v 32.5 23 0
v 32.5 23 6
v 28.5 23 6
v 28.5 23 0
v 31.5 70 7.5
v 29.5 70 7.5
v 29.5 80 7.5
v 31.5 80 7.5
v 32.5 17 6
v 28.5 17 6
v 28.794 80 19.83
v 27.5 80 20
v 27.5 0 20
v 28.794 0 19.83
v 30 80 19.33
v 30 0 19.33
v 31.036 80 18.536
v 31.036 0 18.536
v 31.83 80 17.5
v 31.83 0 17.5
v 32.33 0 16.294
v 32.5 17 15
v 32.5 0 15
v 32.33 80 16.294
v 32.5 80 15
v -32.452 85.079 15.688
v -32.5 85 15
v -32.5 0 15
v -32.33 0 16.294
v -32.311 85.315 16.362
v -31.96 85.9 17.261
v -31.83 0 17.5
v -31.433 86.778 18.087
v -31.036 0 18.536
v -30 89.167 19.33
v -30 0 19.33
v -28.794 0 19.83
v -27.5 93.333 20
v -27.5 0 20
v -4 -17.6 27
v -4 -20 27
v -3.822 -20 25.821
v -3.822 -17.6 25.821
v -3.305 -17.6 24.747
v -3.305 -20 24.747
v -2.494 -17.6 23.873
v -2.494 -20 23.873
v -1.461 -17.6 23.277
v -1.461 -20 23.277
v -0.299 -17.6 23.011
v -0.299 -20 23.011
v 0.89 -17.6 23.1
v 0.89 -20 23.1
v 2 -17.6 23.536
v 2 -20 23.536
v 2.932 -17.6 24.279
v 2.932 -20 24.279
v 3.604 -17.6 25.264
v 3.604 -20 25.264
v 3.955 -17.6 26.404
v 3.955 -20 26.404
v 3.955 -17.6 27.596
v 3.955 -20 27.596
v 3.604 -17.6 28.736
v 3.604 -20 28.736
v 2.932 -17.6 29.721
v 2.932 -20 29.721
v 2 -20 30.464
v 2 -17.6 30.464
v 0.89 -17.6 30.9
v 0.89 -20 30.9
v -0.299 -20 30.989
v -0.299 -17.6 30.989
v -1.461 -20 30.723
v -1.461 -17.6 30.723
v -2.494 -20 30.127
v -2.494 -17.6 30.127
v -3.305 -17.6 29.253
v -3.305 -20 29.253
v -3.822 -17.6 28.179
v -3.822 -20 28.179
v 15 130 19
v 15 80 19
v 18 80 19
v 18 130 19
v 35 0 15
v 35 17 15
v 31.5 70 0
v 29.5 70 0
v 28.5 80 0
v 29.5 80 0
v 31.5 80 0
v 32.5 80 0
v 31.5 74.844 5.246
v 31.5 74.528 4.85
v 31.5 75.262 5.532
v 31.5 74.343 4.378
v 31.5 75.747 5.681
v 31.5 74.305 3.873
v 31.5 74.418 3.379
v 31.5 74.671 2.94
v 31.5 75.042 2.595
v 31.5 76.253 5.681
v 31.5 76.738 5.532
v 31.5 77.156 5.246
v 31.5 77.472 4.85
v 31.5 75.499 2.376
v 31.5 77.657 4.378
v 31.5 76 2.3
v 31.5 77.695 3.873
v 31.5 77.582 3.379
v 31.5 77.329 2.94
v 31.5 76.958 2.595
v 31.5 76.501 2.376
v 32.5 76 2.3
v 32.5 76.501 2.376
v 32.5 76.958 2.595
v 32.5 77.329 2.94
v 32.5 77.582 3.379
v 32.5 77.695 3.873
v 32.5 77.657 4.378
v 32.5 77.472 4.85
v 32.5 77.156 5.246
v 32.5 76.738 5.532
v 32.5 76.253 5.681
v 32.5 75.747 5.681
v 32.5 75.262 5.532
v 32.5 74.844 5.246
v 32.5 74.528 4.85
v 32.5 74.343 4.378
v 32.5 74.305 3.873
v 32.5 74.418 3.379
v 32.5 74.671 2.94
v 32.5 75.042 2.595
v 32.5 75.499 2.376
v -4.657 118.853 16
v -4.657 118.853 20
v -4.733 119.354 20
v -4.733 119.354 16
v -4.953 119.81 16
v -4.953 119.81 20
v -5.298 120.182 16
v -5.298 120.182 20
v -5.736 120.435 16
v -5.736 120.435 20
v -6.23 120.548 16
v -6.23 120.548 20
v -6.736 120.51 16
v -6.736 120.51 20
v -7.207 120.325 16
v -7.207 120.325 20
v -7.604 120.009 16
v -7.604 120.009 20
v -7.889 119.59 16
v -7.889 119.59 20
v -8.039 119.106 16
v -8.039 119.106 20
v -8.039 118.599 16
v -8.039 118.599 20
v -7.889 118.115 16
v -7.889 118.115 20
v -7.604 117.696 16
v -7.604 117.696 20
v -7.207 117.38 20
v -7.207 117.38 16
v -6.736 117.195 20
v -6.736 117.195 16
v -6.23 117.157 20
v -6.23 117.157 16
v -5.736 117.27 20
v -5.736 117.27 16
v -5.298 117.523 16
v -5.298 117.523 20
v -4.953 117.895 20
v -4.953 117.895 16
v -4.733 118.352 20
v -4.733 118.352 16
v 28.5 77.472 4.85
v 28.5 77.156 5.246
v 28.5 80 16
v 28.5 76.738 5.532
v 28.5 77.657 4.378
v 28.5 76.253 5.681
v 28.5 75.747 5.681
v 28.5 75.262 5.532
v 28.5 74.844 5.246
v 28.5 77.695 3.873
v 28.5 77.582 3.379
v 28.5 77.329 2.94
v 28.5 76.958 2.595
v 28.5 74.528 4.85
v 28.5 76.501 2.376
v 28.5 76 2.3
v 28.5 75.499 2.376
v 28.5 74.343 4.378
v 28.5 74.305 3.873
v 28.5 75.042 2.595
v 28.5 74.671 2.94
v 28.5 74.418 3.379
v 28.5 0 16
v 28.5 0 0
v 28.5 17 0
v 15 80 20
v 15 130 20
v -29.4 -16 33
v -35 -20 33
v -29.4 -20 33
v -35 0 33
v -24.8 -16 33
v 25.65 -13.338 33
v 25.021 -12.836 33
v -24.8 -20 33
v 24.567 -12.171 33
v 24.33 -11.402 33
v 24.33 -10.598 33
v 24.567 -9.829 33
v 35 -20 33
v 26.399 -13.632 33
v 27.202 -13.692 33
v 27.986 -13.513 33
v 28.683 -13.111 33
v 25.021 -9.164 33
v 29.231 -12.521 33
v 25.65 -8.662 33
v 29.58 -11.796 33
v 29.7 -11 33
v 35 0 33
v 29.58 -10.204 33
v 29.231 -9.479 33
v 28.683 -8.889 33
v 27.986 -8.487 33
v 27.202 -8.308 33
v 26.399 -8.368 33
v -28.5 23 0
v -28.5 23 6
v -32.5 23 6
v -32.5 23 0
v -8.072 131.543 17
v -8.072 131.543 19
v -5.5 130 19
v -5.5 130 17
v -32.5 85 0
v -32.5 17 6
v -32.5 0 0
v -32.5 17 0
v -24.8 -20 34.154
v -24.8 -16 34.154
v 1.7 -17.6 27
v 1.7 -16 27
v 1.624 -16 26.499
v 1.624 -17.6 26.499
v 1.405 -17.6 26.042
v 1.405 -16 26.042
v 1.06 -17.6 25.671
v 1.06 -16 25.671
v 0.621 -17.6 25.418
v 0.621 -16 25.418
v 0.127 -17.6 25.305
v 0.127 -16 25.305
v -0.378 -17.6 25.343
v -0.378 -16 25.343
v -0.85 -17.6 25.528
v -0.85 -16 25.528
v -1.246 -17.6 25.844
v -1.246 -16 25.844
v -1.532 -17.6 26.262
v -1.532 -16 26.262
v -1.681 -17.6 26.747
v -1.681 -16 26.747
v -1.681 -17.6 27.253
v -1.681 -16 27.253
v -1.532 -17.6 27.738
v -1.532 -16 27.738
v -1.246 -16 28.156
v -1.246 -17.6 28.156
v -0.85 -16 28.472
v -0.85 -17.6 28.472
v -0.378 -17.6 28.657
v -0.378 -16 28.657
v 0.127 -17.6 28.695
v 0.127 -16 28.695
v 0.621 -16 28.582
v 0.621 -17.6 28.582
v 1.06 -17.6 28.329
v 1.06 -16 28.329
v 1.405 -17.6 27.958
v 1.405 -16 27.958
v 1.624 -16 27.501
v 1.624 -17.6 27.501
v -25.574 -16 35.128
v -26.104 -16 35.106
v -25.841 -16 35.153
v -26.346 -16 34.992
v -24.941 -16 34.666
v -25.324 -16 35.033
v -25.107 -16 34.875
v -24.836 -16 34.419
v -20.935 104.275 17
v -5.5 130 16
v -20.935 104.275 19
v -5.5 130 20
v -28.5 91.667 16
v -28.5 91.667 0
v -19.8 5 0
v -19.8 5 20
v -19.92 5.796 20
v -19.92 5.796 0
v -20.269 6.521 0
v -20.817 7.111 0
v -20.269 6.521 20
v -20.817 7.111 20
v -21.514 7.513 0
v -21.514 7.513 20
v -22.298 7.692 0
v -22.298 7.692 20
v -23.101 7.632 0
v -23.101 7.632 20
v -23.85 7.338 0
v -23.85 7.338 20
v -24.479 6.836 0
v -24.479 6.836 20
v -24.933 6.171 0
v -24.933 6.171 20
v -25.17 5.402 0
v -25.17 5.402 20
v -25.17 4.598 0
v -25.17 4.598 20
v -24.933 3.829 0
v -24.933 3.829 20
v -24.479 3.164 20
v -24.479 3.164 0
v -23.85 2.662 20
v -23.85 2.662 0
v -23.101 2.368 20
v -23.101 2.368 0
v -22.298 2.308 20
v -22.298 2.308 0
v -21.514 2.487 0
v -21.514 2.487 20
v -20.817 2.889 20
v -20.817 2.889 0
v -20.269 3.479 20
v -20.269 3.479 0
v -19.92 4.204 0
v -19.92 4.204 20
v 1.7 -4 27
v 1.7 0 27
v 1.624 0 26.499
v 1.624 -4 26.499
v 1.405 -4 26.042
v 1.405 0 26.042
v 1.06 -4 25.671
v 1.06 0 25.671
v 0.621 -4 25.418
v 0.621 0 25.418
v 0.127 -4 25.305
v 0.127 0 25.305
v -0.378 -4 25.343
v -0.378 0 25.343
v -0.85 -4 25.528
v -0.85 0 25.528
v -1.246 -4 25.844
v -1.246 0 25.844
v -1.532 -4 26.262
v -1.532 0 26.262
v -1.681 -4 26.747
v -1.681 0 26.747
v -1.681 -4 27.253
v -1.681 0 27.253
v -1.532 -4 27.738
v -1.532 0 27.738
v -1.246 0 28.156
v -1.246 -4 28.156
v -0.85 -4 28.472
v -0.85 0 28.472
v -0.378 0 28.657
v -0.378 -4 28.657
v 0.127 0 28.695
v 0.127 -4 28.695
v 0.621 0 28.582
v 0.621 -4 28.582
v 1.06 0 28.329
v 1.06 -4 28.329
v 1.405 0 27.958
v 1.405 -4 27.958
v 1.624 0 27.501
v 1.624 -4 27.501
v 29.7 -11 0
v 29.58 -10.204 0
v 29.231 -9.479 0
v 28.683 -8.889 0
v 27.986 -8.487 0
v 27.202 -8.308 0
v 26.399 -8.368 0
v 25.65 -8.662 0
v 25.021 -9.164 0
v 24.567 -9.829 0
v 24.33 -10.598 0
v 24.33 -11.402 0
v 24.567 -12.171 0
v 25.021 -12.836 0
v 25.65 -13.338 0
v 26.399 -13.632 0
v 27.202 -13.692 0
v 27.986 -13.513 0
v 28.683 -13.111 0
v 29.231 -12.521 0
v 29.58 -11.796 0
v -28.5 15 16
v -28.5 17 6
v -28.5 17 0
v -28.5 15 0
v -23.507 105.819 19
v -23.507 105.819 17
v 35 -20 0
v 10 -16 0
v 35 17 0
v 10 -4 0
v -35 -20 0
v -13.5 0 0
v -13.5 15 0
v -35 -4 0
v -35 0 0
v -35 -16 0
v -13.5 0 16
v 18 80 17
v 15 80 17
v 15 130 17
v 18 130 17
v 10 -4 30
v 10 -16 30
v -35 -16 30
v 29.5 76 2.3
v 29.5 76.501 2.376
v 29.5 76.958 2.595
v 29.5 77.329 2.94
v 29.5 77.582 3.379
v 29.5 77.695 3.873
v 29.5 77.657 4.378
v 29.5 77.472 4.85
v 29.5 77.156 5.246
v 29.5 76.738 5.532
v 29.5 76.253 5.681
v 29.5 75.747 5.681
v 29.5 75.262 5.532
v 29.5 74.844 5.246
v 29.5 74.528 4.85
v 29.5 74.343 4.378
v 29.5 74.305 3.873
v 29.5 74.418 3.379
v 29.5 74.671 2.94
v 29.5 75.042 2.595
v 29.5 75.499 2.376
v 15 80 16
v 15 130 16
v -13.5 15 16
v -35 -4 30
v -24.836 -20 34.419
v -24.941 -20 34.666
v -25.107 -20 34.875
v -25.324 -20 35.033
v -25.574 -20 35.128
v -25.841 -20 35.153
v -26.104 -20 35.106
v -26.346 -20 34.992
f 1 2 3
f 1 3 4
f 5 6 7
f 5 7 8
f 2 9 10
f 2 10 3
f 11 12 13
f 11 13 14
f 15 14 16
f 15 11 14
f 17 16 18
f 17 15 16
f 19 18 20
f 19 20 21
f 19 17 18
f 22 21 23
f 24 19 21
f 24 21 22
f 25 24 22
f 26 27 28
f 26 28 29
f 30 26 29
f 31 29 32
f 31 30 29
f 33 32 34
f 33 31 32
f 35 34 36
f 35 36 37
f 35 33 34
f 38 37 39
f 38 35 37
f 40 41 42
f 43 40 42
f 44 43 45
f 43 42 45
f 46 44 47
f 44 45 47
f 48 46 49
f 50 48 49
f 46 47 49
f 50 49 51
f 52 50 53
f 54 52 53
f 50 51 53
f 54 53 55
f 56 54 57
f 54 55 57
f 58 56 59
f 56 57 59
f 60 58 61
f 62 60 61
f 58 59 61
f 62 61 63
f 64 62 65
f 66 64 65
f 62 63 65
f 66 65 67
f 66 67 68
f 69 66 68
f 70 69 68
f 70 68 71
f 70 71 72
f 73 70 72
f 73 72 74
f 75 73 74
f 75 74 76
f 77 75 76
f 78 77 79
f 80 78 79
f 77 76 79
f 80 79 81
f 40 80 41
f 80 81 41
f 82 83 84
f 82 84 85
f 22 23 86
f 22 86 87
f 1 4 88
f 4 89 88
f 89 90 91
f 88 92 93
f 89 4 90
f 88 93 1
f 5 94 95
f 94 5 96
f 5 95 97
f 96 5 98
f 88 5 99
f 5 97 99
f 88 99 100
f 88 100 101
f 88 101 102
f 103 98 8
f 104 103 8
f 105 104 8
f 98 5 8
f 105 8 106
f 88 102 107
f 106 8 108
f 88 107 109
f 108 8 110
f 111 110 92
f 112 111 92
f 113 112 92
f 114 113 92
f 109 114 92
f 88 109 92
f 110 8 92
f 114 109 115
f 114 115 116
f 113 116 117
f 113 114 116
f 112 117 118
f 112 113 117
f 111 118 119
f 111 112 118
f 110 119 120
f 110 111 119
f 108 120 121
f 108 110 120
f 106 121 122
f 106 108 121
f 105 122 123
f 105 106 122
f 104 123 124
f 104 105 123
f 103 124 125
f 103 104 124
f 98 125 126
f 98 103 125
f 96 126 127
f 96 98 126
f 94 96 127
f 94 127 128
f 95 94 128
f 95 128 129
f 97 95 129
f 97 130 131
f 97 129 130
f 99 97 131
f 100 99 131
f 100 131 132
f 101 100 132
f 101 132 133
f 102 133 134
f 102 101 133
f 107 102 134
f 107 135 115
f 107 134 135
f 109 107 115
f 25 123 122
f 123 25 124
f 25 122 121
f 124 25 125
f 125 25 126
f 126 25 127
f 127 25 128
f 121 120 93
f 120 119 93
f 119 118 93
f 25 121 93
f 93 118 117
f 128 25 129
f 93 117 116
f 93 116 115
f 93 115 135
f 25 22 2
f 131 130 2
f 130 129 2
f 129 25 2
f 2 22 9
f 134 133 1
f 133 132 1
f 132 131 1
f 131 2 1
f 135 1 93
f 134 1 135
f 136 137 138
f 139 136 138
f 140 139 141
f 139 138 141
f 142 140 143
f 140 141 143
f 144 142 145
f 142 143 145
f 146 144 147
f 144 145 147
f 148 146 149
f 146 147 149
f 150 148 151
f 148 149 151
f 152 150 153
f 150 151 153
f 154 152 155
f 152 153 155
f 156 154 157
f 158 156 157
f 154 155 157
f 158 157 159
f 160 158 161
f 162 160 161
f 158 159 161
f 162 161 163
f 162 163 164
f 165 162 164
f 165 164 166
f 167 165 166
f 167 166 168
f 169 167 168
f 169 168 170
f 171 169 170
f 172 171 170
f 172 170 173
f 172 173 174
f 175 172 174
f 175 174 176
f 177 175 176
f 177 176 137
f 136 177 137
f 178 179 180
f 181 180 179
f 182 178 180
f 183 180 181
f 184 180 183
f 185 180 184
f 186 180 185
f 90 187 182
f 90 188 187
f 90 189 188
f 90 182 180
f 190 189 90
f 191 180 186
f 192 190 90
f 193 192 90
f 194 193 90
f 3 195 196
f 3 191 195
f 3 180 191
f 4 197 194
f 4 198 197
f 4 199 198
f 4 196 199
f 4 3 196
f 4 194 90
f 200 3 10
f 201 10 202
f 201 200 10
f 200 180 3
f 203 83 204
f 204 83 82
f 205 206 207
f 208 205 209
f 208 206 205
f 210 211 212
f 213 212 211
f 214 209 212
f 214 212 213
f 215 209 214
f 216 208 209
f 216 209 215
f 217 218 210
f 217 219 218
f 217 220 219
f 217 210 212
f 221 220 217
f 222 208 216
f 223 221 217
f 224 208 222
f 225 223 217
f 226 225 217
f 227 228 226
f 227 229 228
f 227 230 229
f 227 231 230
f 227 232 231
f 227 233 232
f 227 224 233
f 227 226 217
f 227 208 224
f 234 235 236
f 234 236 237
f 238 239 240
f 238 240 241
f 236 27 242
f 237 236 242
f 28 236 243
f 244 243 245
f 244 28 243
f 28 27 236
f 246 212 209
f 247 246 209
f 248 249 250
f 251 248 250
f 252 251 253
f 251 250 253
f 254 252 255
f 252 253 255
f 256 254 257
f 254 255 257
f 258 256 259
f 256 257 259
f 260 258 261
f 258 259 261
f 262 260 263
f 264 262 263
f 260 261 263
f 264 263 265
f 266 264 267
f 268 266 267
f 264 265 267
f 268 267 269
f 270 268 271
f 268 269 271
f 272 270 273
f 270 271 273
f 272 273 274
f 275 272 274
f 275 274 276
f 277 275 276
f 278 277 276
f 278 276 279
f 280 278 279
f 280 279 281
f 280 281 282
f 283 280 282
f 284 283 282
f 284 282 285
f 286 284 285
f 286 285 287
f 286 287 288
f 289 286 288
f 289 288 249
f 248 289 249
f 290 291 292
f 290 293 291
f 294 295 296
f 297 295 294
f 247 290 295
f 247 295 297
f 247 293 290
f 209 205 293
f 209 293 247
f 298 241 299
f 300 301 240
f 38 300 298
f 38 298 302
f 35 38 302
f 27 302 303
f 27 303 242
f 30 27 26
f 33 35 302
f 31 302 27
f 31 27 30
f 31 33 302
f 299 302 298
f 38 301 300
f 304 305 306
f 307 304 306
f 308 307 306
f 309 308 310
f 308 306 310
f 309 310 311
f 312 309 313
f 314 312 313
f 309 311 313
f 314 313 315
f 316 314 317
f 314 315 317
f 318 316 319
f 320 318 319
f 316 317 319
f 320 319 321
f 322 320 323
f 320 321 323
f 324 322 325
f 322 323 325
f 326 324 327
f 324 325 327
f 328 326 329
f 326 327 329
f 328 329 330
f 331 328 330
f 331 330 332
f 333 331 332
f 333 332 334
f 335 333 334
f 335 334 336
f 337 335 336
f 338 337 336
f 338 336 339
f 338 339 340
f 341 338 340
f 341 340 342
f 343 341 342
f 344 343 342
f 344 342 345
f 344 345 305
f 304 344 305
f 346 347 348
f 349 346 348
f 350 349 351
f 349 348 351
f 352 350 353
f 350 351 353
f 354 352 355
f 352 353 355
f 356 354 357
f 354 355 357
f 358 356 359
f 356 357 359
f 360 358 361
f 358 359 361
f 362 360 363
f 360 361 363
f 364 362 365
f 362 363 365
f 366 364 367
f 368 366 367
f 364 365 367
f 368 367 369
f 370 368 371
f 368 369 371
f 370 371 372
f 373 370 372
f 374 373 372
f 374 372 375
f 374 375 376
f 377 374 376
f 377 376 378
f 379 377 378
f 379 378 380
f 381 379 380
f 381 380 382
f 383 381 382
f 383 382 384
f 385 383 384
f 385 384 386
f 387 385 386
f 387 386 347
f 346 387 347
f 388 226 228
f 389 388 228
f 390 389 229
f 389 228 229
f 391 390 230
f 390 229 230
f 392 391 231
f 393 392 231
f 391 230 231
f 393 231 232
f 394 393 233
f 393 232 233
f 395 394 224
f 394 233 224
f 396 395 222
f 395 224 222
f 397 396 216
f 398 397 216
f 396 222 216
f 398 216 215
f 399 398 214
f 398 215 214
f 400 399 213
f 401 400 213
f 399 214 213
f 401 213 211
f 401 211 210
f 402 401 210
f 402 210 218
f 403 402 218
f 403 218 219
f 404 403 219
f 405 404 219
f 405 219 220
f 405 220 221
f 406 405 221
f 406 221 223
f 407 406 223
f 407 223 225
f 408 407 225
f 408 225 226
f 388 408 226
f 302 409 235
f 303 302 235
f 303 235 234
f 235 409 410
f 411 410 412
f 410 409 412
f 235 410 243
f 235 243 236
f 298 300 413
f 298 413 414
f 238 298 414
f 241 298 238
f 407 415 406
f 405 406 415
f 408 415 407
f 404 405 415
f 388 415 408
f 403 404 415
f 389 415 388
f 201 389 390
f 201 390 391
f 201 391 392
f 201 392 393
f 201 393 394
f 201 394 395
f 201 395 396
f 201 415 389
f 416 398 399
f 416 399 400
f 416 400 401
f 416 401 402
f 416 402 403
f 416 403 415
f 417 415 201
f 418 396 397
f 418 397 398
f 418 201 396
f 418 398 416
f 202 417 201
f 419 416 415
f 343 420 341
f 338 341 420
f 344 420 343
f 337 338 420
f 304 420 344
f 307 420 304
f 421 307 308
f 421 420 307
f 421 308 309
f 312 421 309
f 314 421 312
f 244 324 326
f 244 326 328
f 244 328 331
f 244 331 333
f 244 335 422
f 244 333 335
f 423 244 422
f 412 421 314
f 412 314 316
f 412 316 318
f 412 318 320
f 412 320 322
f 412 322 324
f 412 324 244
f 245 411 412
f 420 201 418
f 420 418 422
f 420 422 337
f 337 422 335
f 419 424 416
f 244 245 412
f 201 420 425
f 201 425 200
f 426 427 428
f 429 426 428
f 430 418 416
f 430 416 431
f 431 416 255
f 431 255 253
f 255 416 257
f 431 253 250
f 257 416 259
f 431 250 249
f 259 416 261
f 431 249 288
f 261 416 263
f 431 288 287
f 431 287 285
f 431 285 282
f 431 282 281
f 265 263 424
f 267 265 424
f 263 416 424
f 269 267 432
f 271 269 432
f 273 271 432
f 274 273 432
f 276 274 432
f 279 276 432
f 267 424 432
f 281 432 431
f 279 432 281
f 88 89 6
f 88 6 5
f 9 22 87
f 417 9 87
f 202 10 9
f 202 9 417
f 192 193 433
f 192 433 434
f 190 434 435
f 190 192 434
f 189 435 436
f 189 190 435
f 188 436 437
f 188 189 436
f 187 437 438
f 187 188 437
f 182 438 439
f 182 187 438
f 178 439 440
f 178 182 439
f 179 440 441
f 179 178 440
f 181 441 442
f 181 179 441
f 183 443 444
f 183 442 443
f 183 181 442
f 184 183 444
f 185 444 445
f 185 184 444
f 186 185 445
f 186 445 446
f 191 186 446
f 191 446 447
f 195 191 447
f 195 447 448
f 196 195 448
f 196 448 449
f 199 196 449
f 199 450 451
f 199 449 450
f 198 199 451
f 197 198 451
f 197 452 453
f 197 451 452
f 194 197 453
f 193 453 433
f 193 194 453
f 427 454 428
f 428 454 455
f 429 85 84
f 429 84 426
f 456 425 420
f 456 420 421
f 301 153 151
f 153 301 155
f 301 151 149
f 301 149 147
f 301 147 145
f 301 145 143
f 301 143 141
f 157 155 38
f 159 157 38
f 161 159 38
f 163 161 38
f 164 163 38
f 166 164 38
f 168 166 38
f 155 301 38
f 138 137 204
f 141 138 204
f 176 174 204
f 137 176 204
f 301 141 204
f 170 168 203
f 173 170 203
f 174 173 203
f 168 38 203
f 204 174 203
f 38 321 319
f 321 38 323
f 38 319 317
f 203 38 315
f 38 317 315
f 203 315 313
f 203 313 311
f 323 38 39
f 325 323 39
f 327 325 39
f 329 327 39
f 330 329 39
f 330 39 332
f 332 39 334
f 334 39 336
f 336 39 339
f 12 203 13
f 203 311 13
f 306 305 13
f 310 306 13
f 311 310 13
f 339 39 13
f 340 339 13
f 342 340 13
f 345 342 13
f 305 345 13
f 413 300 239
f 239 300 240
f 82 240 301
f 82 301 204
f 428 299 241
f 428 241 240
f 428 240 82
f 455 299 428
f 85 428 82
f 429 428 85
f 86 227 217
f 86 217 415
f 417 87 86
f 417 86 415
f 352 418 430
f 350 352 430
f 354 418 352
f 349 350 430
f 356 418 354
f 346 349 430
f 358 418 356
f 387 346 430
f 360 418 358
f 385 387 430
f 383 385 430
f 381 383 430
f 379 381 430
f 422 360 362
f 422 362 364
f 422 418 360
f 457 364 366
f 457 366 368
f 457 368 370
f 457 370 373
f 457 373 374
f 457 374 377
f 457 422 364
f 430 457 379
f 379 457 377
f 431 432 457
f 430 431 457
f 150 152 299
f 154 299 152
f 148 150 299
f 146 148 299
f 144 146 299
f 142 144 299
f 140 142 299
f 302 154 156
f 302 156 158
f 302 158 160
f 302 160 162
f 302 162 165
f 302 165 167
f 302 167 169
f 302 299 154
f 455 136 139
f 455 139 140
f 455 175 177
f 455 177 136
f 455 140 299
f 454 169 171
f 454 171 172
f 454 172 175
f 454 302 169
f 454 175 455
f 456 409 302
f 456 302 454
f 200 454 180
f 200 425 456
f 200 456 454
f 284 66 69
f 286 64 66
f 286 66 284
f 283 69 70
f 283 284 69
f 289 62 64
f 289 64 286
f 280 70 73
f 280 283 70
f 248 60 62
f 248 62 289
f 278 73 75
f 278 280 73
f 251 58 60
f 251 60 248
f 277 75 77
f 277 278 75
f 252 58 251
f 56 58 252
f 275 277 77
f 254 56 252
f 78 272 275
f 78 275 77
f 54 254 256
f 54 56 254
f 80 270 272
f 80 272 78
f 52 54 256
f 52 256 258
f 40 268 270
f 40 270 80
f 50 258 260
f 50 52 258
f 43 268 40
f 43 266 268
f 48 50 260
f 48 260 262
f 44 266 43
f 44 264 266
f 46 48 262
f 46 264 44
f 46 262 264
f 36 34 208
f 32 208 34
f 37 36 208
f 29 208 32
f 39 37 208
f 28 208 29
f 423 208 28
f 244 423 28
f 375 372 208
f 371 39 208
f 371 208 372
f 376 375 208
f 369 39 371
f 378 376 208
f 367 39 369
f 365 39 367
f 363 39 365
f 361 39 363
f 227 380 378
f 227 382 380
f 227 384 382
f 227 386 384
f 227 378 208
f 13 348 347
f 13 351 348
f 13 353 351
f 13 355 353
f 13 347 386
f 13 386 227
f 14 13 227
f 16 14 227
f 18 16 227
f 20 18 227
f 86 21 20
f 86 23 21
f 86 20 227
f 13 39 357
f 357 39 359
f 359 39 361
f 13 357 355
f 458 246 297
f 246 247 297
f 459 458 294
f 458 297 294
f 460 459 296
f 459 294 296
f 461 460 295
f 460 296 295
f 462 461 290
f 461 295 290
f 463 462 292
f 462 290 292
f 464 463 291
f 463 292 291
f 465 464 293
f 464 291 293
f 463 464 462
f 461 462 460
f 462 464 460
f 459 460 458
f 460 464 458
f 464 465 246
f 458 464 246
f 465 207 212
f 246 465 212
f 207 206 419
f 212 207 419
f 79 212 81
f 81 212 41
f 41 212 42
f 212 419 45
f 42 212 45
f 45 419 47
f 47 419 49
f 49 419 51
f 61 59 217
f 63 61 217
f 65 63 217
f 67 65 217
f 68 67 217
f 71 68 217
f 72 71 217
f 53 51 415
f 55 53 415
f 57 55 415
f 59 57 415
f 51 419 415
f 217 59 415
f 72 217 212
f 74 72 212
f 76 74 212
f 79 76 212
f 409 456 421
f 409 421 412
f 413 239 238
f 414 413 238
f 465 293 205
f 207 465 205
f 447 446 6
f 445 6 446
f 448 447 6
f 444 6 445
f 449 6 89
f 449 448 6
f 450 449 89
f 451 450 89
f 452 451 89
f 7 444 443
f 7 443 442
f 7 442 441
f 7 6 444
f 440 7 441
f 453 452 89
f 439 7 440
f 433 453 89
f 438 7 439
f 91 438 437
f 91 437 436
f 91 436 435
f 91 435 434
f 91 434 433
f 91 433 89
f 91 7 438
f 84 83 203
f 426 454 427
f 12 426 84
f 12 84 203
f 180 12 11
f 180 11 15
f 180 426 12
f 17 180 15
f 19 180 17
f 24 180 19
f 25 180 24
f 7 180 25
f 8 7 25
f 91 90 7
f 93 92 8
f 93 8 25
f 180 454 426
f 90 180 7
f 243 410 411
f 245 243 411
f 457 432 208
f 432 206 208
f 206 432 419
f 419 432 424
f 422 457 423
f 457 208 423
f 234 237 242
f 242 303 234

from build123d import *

# Parameters (mm, degrees)
SKETCH1_W                = 65
SKETCH1_H                = 40
BOSS_EXTRUDE1_DEPTH      = 130
SHELL1_T                 = -4
FILLET1_R                = 5
CUT_EXTRUDE1_DEPTH       = 21
CUT_EXTRUDE1_DEPTH_BACK  = 21
SKETCH3_W                = 17.5
SKETCH3_H                = 50
CUT_EXTRUDE2_DEPTH       = 21
CUT_EXTRUDE2_DEPTH_BACK  = 21
SKETCH5_W                = 2
SKETCH5_H                = 50
BOSS_EXTRUDE2_DEPTH      = 3
SKETCH6_W                = 2
SKETCH6_H                = 30
BOSS_EXTRUDE3_DEPTH      = 3
SKETCH8_W                = 70
SKETCH8_H                = 66
BOSS_EXTRUDE4_DEPTH      = 20
SKETCH10_W               = 60
SKETCH10_H               = 12
CUT_EXTRUDE4_DEPTH       = 45
SKETCH23_W               = 2
SKETCH23_H               = 15
CUT_EXTRUDE10_DEPTH      = 10
CUT_EXTRUDE11_START      = -10
SKETCH24_R               = 1.7
CUT_EXTRUDE11_DEPTH      = 13.5
SKETCH27_W               = 70
SKETCH27_H               = 33
CUT_EXTRUDE12_DEPTH      = 132.543487266
CUT_EXTRUDE12_DEPTH_BACK = 21
SKETCH31_R               = 2.7
CUT_EXTRUDE13_DEPTH      = 1
CUT_EXTRUDE13_DEPTH_BACK = 34
SKETCH34_R               = 1.7
CUT_EXTRUDE15_DEPTH      = 132.543487266
CUT_EXTRUDE15_DEPTH_BACK = 21
SKETCH37_W               = 6
SKETCH37_H               = 6
CUT_EXTRUDE17_DEPTH      = 3.5
CUT_EXTRUDE17_DEPTH_BACK = 68.5
SKETCH38_W               = 15
SKETCH38_H               = 17
BOSS_EXTRUDE9_DEPTH      = 2.5
SKETCH41_R               = 4
CUT_EXTRUDE18_DEPTH      = 2.4
SKETCH42_W               = 4.6
SKETCH42_H               = 4
BOSS_EXTRUDE10_DEPTH     = 3
CUT_EXTRUDE19_DEPTH      = 5
FILLET2_R                = 1
SKETCH46_R               = 1.7
CUT_EXTRUDE20_DEPTH      = 10
SKETCH50_W               = 15
SKETCH50_H               = 15
BOSS_EXTRUDE11_DEPTH     = 16
SKETCH51_R               = 2.7
CUT_EXTRUDE21_DEPTH      = 16.153953894
CUT_EXTRUDE21_DEPTH_BACK = 21


with BuildPart() as part:
    # Sketch1 → Boss-Extrude1 (new body)
    with BuildSketch(Plane(origin=(0, 0, 0), x_dir=(1, 0, 0), z_dir=(0, 1, 0))):
        Rectangle(SKETCH1_W, SKETCH1_H)
    extrude(amount=BOSS_EXTRUDE1_DEPTH)

    # Shell1
    shell1_openings = [part.faces().sort_by_distance(p)[0] for p in [
        (0, 130, 0),
        (0, 0, 0),
    ]]
    offset(amount=SHELL1_T, openings=shell1_openings, kind=Kind.INTERSECTION)

    # Fillet1
    fillet1_edges = [part.edges().sort_by_distance(p)[0] for p in [
        (32.5, 65, 20),
        (-32.5, 65, 20),
        (-32.5, 65, -20),
        (32.5, 65, -20),
    ]]
    fillet(fillet1_edges, radius=FILLET1_R)

    # Sketch2 → Cut-Extrude1 (cut, two sides)
    with BuildSketch(Plane.XY) as cut_extrude1_sk:
        Polygon((-5.5, 130), (-32.5, 85), (-32.5, 130), align=None)
    extrude(amount=CUT_EXTRUDE1_DEPTH, mode=Mode.SUBTRACT)
    extrude(cut_extrude1_sk.sketch, amount=-CUT_EXTRUDE1_DEPTH_BACK, mode=Mode.SUBTRACT)

    # Sketch3 → Cut-Extrude2 (cut, two sides)
    with BuildSketch(Plane.XY) as cut_extrude2_sk:
        with Locations((23.75, 105)):
            Rectangle(SKETCH3_W, SKETCH3_H)
    extrude(amount=CUT_EXTRUDE2_DEPTH, mode=Mode.SUBTRACT)
    extrude(cut_extrude2_sk.sketch, amount=-CUT_EXTRUDE2_DEPTH_BACK, mode=Mode.SUBTRACT)

    # Sketch5 → Boss-Extrude2 (add)
    with BuildSketch(Plane(origin=(15, 0, 0), x_dir=(0, 0, -1), z_dir=(1, 0, 0))):
        with Locations((-18, 105)):
            Rectangle(SKETCH5_W, SKETCH5_H)
    boss_extrude2 = extrude(amount=BOSS_EXTRUDE2_DEPTH)

    # Mirror1: Boss-Extrude2 across plane
    add(boss_extrude2.mirror(Plane.XY))

    # Sketch6 → Boss-Extrude3 (add)
    with BuildSketch(Plane(origin=(-61.397058824, 36.838235294, 0), x_dir=(0, 0, 1), z_dir=(-0.857492926, 0.514495755, 0))):
        with Locations((-18, 93.644353688)):
            Rectangle(SKETCH6_W, SKETCH6_H)
    boss_extrude3 = extrude(amount=BOSS_EXTRUDE3_DEPTH)

    # Mirror2: Boss-Extrude3 across plane
    add(boss_extrude3.mirror(Plane.XY))

    # Sketch8 → Boss-Extrude4 (add)
    with BuildSketch(Plane(origin=(0, 0, 0), x_dir=(1, 0, 0), z_dir=(0, 1, 0))):
        Rectangle(SKETCH8_W, SKETCH8_H)
    extrude(amount=-BOSS_EXTRUDE4_DEPTH)

    # Sketch10 → Cut-Extrude4 (cut)
    with BuildSketch(Plane.ZY.offset(35)):
        with Locations((0, -10)):
            Rectangle(SKETCH10_W, SKETCH10_H)
    extrude(amount=-CUT_EXTRUDE4_DEPTH, mode=Mode.SUBTRACT)

    # Sketch23 → Cut-Extrude10 (cut)
    with BuildSketch(Plane(origin=(0, 80, 0), x_dir=(1, 0, 0), z_dir=(0, 1, 0))):
        with Locations((30.5, 0)):
            Rectangle(SKETCH23_W, SKETCH23_H)
    extrude(amount=-CUT_EXTRUDE10_DEPTH, mode=Mode.SUBTRACT)

    # Sketch24 → Cut-Extrude11 (cut)
    with BuildSketch(Plane(origin=(32.5, 0, 0), x_dir=(0, 0, -1), z_dir=(1, 0, 0)).offset(CUT_EXTRUDE11_START)):
        with Locations((-4, 76)):
            Circle(SKETCH24_R)
    cut_extrude11 = extrude(amount=CUT_EXTRUDE11_DEPTH, mode=Mode.SUBTRACT)

    # Mirror4: Cut-Extrude11 across plane
    add(cut_extrude11.mirror(Plane.XY), mode=Mode.SUBTRACT)

    # Sketch27 → Cut-Extrude12 (cut, two sides)
    with BuildSketch(Plane(origin=(0, 0, 0), x_dir=(1, 0, 0), z_dir=(0, 1, 0))) as cut_extrude12_sk:
        with Locations((0, 16.5)):
            Rectangle(SKETCH27_W, SKETCH27_H)
    extrude(amount=CUT_EXTRUDE12_DEPTH, mode=Mode.SUBTRACT)
    extrude(cut_extrude12_sk.sketch, amount=-CUT_EXTRUDE12_DEPTH_BACK, mode=Mode.SUBTRACT)

    # Sketch31 → Cut-Extrude13 (cut, two sides)
    with BuildSketch(Plane.XY.offset(33)) as cut_extrude13_sk:
        with Locations((27, -11)):
            Circle(SKETCH31_R)
    extrude(amount=CUT_EXTRUDE13_DEPTH, mode=Mode.SUBTRACT)
    extrude(cut_extrude13_sk.sketch, amount=-CUT_EXTRUDE13_DEPTH_BACK, mode=Mode.SUBTRACT)

    # Sketch34 → Cut-Extrude15 (cut, two sides)
    with BuildSketch(Plane(origin=(0, 0, 0), x_dir=(1, 0, 0), z_dir=(0, 1, 0))) as cut_extrude15_sk:
        with Locations((0, -27)):
            Circle(SKETCH34_R)
    extrude(amount=CUT_EXTRUDE15_DEPTH, mode=Mode.SUBTRACT)
    extrude(cut_extrude15_sk.sketch, amount=-CUT_EXTRUDE15_DEPTH_BACK, mode=Mode.SUBTRACT)

    # Sketch37 → Cut-Extrude17 (cut, two sides)
    with BuildSketch(Plane(origin=(32.5, 0, 0), x_dir=(0, 0, -1), z_dir=(1, 0, 0))) as cut_extrude17_sk:
        with Locations((-3, 20)):
            Rectangle(SKETCH37_W, SKETCH37_H)
    extrude(amount=CUT_EXTRUDE17_DEPTH, mode=Mode.SUBTRACT)
    extrude(cut_extrude17_sk.sketch, amount=-CUT_EXTRUDE17_DEPTH_BACK, mode=Mode.SUBTRACT)

    # Sketch38 → Boss-Extrude9 (add)
    with BuildSketch(Plane(origin=(32.5, 0, 0), x_dir=(0, 0, -1), z_dir=(1, 0, 0))):
        with Locations((-7.5, 8.5)):
            Rectangle(SKETCH38_W, SKETCH38_H)
    extrude(amount=BOSS_EXTRUDE9_DEPTH)

    # Sketch41 → Cut-Extrude18 (cut)
    with BuildSketch(Plane(origin=(0, -20, 0), x_dir=(-1, 0, 0), z_dir=(0, -1, 0))):
        with Locations((0, -27)):
            Circle(SKETCH41_R)
    extrude(amount=-CUT_EXTRUDE18_DEPTH, mode=Mode.SUBTRACT)

    # Sketch42 → Boss-Extrude10 (add)
    with BuildSketch(Plane.XY.offset(33)):
        with Locations((-27.1, -18)):
            Rectangle(SKETCH42_W, SKETCH42_H)
    extrude(amount=BOSS_EXTRUDE10_DEPTH)

    # Sketch43 → Cut-Extrude19 (cut, through all)
    with BuildSketch(Plane(origin=(0, -16, 0), x_dir=(1, 0, 0), z_dir=(0, 1, 0))):
        Polygon((-24.8, -36), (-29.4, -33), (-29.4, -36), align=None)
    extrude(amount=-CUT_EXTRUDE19_DEPTH, mode=Mode.SUBTRACT)

    # Fillet2
    fillet2_edges = [part.edges().sort_by_distance(p)[0] for p in [
        (-24.8, -18, 36),
    ]]
    fillet(fillet2_edges, radius=FILLET2_R)

    # Sketch46 → Cut-Extrude20 (cut)
    with BuildSketch(Plane.XY.offset(20)):
        with Locations((-6.357492926, 118.852591966)):
            Circle(SKETCH46_R)
    extrude(amount=-CUT_EXTRUDE20_DEPTH, mode=Mode.SUBTRACT)

    # Sketch50 → Boss-Extrude11 (add)
    with BuildSketch(Plane(origin=(0, 0, 16), x_dir=(-1, 0, 0), z_dir=(0, 0, -1))):
        with Locations((21, 7.5)):
            Rectangle(SKETCH50_W, SKETCH50_H)
    extrude(amount=BOSS_EXTRUDE11_DEPTH)

    # Sketch51 → Cut-Extrude21 (cut, two sides)
    with BuildSketch(Plane.XY.offset(20)) as cut_extrude21_sk:
        with Locations((-22.5, 5)):
            Circle(SKETCH51_R)
    extrude(amount=CUT_EXTRUDE21_DEPTH, mode=Mode.SUBTRACT)
    extrude(cut_extrude21_sk.sketch, amount=-CUT_EXTRUDE21_DEPTH_BACK, mode=Mode.SUBTRACT)


solid = part.part
